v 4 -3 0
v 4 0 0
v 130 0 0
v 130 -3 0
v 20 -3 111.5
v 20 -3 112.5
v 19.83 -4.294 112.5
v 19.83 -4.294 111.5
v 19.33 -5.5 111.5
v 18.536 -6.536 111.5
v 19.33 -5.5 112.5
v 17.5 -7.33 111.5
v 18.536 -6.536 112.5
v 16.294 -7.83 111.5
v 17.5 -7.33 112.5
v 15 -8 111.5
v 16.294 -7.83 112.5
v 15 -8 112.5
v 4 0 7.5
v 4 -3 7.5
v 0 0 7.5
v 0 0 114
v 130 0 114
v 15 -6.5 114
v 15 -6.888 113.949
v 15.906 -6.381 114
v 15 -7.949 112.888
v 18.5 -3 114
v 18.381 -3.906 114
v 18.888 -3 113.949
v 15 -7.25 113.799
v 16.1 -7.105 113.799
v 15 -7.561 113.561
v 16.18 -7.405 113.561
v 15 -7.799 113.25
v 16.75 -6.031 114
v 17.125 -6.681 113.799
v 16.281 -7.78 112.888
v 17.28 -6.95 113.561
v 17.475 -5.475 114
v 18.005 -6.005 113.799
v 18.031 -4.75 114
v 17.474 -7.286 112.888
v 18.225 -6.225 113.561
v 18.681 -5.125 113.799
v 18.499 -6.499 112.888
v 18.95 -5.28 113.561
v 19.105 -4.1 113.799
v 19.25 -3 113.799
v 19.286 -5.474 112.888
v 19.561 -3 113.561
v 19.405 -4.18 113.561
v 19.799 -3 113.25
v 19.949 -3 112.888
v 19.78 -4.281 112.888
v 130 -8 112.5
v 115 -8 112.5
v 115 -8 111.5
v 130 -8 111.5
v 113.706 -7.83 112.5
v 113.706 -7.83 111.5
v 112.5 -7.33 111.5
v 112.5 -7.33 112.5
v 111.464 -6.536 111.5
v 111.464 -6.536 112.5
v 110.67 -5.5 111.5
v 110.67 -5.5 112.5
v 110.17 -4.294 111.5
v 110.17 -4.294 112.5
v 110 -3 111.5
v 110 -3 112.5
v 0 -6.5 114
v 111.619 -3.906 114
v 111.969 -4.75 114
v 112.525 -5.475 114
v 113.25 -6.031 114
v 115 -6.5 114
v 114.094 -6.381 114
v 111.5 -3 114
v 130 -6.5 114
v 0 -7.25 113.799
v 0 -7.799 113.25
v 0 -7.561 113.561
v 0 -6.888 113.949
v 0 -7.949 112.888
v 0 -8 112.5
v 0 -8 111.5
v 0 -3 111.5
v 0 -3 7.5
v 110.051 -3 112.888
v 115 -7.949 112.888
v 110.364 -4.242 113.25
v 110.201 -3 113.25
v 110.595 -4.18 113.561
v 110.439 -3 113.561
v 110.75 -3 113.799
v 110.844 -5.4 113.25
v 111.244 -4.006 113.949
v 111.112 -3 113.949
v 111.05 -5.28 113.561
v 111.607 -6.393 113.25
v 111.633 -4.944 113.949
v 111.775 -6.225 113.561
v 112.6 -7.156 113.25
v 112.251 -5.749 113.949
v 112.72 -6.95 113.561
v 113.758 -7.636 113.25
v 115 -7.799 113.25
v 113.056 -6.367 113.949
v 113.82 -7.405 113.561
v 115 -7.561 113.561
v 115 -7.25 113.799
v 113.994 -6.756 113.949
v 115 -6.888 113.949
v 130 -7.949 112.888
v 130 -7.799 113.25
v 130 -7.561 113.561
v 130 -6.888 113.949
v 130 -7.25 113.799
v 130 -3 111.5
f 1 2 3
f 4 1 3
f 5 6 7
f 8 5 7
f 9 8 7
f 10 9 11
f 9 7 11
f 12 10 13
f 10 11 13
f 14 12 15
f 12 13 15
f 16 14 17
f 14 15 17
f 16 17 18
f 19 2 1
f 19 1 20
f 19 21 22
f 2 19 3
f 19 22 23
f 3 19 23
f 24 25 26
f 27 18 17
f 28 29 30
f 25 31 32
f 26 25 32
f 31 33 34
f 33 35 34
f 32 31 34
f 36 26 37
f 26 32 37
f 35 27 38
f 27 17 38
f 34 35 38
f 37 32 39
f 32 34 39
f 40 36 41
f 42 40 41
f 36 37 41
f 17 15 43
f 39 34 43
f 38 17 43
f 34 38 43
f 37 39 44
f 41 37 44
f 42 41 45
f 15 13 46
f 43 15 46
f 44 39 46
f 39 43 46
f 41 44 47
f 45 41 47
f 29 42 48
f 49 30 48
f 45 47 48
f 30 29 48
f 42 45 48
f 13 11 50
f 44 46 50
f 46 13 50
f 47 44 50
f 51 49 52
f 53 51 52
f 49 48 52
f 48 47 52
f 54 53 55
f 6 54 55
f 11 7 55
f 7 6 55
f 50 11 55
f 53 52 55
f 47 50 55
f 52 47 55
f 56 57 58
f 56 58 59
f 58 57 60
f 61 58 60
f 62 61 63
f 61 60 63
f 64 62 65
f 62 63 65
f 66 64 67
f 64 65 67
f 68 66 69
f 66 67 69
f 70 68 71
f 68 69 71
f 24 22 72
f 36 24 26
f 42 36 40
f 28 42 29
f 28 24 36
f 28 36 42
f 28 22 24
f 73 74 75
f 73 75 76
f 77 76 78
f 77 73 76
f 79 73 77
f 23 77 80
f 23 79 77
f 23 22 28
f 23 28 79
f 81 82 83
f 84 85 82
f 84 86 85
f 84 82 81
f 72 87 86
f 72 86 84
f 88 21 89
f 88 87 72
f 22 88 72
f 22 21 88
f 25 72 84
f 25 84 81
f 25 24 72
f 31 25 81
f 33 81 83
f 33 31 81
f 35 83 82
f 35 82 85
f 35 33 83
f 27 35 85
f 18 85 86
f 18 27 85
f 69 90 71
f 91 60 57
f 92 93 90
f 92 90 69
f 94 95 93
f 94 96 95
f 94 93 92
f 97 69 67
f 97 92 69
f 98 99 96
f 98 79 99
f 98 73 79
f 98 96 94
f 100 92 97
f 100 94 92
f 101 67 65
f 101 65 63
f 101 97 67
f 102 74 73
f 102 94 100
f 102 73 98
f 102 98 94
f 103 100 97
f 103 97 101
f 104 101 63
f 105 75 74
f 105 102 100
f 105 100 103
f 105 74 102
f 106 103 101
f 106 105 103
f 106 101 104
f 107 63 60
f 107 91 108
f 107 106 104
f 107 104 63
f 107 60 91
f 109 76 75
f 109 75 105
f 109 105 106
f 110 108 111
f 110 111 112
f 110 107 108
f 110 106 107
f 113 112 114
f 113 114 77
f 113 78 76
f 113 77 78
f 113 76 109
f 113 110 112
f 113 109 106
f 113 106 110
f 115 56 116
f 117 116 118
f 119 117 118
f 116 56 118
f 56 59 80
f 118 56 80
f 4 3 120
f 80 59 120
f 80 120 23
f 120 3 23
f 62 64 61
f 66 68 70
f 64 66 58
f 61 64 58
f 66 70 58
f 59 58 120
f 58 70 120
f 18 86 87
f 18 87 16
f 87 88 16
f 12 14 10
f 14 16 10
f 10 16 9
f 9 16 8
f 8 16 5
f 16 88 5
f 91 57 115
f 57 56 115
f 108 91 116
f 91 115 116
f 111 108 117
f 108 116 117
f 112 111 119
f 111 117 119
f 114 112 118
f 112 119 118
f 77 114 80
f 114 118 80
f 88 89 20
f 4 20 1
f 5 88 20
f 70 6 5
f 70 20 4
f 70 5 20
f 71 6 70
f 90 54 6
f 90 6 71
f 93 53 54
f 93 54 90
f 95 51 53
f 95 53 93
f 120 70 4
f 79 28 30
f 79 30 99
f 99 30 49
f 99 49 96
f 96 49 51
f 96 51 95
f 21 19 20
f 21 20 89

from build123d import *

# Parameters (mm, degrees)
F0_W     = 130
F0_H     = 114
F1_DEPTH = 3
F2_W     = 20
F2_H     = 2.5
F3_DEPTH = 5
F4_R     = 4.99999
F5_R     = 1.5
F6_W     = 4
F6_H     = 7.5
F7_DEPTH = 25


# Not quite as in the source:
# - a fillet or chamfer is up to 0.001 mm smaller than in the source, because OpenCascade refuses the exact size


with BuildPart() as f1:
    # F0 (on Front) → F1 (new body)
    with BuildSketch(Plane.XZ):
        with Locations((65, 57)):
            Rectangle(F0_W, F0_H)
    extrude(amount=F1_DEPTH)

    # F2 (on face) → F3 (join)
    with BuildSketch(Plane.XZ.offset(3)):
        with Locations((10, 112.75)):
            Rectangle(F2_W, F2_H)
        with Locations((120, 112.75)):
            Rectangle(F2_W, F2_H)
    extrude(amount=F3_DEPTH)

    # F4 (radius 5 in the source; OpenCascade refuses exactly that, so slightly less here)
    f4_edges = [f1.edges().sort_by_distance(p)[0] for p in [
        (20, -8, 112.75),
        (110, -8, 112.75),
    ]]
    fillet(f4_edges, radius=F4_R)

    # F5
    f5_edges = [f1.edges().sort_by_distance(p)[0] for p in [
        (7.500005, -8, 114),
        (122.499995, -8, 114),
    ]]
    fillet(f5_edges, radius=F5_R)

    # F6 (on face) → F7 (cut)
    with BuildSketch(Plane(origin=(0, 0, 0), x_dir=(-1, 0, 0), z_dir=(0, 1, 0))):
        with Locations((-2, 3.75)):
            Rectangle(F6_W, F6_H)
    extrude(amount=-F7_DEPTH, mode=Mode.SUBTRACT)


solid = f1.part
